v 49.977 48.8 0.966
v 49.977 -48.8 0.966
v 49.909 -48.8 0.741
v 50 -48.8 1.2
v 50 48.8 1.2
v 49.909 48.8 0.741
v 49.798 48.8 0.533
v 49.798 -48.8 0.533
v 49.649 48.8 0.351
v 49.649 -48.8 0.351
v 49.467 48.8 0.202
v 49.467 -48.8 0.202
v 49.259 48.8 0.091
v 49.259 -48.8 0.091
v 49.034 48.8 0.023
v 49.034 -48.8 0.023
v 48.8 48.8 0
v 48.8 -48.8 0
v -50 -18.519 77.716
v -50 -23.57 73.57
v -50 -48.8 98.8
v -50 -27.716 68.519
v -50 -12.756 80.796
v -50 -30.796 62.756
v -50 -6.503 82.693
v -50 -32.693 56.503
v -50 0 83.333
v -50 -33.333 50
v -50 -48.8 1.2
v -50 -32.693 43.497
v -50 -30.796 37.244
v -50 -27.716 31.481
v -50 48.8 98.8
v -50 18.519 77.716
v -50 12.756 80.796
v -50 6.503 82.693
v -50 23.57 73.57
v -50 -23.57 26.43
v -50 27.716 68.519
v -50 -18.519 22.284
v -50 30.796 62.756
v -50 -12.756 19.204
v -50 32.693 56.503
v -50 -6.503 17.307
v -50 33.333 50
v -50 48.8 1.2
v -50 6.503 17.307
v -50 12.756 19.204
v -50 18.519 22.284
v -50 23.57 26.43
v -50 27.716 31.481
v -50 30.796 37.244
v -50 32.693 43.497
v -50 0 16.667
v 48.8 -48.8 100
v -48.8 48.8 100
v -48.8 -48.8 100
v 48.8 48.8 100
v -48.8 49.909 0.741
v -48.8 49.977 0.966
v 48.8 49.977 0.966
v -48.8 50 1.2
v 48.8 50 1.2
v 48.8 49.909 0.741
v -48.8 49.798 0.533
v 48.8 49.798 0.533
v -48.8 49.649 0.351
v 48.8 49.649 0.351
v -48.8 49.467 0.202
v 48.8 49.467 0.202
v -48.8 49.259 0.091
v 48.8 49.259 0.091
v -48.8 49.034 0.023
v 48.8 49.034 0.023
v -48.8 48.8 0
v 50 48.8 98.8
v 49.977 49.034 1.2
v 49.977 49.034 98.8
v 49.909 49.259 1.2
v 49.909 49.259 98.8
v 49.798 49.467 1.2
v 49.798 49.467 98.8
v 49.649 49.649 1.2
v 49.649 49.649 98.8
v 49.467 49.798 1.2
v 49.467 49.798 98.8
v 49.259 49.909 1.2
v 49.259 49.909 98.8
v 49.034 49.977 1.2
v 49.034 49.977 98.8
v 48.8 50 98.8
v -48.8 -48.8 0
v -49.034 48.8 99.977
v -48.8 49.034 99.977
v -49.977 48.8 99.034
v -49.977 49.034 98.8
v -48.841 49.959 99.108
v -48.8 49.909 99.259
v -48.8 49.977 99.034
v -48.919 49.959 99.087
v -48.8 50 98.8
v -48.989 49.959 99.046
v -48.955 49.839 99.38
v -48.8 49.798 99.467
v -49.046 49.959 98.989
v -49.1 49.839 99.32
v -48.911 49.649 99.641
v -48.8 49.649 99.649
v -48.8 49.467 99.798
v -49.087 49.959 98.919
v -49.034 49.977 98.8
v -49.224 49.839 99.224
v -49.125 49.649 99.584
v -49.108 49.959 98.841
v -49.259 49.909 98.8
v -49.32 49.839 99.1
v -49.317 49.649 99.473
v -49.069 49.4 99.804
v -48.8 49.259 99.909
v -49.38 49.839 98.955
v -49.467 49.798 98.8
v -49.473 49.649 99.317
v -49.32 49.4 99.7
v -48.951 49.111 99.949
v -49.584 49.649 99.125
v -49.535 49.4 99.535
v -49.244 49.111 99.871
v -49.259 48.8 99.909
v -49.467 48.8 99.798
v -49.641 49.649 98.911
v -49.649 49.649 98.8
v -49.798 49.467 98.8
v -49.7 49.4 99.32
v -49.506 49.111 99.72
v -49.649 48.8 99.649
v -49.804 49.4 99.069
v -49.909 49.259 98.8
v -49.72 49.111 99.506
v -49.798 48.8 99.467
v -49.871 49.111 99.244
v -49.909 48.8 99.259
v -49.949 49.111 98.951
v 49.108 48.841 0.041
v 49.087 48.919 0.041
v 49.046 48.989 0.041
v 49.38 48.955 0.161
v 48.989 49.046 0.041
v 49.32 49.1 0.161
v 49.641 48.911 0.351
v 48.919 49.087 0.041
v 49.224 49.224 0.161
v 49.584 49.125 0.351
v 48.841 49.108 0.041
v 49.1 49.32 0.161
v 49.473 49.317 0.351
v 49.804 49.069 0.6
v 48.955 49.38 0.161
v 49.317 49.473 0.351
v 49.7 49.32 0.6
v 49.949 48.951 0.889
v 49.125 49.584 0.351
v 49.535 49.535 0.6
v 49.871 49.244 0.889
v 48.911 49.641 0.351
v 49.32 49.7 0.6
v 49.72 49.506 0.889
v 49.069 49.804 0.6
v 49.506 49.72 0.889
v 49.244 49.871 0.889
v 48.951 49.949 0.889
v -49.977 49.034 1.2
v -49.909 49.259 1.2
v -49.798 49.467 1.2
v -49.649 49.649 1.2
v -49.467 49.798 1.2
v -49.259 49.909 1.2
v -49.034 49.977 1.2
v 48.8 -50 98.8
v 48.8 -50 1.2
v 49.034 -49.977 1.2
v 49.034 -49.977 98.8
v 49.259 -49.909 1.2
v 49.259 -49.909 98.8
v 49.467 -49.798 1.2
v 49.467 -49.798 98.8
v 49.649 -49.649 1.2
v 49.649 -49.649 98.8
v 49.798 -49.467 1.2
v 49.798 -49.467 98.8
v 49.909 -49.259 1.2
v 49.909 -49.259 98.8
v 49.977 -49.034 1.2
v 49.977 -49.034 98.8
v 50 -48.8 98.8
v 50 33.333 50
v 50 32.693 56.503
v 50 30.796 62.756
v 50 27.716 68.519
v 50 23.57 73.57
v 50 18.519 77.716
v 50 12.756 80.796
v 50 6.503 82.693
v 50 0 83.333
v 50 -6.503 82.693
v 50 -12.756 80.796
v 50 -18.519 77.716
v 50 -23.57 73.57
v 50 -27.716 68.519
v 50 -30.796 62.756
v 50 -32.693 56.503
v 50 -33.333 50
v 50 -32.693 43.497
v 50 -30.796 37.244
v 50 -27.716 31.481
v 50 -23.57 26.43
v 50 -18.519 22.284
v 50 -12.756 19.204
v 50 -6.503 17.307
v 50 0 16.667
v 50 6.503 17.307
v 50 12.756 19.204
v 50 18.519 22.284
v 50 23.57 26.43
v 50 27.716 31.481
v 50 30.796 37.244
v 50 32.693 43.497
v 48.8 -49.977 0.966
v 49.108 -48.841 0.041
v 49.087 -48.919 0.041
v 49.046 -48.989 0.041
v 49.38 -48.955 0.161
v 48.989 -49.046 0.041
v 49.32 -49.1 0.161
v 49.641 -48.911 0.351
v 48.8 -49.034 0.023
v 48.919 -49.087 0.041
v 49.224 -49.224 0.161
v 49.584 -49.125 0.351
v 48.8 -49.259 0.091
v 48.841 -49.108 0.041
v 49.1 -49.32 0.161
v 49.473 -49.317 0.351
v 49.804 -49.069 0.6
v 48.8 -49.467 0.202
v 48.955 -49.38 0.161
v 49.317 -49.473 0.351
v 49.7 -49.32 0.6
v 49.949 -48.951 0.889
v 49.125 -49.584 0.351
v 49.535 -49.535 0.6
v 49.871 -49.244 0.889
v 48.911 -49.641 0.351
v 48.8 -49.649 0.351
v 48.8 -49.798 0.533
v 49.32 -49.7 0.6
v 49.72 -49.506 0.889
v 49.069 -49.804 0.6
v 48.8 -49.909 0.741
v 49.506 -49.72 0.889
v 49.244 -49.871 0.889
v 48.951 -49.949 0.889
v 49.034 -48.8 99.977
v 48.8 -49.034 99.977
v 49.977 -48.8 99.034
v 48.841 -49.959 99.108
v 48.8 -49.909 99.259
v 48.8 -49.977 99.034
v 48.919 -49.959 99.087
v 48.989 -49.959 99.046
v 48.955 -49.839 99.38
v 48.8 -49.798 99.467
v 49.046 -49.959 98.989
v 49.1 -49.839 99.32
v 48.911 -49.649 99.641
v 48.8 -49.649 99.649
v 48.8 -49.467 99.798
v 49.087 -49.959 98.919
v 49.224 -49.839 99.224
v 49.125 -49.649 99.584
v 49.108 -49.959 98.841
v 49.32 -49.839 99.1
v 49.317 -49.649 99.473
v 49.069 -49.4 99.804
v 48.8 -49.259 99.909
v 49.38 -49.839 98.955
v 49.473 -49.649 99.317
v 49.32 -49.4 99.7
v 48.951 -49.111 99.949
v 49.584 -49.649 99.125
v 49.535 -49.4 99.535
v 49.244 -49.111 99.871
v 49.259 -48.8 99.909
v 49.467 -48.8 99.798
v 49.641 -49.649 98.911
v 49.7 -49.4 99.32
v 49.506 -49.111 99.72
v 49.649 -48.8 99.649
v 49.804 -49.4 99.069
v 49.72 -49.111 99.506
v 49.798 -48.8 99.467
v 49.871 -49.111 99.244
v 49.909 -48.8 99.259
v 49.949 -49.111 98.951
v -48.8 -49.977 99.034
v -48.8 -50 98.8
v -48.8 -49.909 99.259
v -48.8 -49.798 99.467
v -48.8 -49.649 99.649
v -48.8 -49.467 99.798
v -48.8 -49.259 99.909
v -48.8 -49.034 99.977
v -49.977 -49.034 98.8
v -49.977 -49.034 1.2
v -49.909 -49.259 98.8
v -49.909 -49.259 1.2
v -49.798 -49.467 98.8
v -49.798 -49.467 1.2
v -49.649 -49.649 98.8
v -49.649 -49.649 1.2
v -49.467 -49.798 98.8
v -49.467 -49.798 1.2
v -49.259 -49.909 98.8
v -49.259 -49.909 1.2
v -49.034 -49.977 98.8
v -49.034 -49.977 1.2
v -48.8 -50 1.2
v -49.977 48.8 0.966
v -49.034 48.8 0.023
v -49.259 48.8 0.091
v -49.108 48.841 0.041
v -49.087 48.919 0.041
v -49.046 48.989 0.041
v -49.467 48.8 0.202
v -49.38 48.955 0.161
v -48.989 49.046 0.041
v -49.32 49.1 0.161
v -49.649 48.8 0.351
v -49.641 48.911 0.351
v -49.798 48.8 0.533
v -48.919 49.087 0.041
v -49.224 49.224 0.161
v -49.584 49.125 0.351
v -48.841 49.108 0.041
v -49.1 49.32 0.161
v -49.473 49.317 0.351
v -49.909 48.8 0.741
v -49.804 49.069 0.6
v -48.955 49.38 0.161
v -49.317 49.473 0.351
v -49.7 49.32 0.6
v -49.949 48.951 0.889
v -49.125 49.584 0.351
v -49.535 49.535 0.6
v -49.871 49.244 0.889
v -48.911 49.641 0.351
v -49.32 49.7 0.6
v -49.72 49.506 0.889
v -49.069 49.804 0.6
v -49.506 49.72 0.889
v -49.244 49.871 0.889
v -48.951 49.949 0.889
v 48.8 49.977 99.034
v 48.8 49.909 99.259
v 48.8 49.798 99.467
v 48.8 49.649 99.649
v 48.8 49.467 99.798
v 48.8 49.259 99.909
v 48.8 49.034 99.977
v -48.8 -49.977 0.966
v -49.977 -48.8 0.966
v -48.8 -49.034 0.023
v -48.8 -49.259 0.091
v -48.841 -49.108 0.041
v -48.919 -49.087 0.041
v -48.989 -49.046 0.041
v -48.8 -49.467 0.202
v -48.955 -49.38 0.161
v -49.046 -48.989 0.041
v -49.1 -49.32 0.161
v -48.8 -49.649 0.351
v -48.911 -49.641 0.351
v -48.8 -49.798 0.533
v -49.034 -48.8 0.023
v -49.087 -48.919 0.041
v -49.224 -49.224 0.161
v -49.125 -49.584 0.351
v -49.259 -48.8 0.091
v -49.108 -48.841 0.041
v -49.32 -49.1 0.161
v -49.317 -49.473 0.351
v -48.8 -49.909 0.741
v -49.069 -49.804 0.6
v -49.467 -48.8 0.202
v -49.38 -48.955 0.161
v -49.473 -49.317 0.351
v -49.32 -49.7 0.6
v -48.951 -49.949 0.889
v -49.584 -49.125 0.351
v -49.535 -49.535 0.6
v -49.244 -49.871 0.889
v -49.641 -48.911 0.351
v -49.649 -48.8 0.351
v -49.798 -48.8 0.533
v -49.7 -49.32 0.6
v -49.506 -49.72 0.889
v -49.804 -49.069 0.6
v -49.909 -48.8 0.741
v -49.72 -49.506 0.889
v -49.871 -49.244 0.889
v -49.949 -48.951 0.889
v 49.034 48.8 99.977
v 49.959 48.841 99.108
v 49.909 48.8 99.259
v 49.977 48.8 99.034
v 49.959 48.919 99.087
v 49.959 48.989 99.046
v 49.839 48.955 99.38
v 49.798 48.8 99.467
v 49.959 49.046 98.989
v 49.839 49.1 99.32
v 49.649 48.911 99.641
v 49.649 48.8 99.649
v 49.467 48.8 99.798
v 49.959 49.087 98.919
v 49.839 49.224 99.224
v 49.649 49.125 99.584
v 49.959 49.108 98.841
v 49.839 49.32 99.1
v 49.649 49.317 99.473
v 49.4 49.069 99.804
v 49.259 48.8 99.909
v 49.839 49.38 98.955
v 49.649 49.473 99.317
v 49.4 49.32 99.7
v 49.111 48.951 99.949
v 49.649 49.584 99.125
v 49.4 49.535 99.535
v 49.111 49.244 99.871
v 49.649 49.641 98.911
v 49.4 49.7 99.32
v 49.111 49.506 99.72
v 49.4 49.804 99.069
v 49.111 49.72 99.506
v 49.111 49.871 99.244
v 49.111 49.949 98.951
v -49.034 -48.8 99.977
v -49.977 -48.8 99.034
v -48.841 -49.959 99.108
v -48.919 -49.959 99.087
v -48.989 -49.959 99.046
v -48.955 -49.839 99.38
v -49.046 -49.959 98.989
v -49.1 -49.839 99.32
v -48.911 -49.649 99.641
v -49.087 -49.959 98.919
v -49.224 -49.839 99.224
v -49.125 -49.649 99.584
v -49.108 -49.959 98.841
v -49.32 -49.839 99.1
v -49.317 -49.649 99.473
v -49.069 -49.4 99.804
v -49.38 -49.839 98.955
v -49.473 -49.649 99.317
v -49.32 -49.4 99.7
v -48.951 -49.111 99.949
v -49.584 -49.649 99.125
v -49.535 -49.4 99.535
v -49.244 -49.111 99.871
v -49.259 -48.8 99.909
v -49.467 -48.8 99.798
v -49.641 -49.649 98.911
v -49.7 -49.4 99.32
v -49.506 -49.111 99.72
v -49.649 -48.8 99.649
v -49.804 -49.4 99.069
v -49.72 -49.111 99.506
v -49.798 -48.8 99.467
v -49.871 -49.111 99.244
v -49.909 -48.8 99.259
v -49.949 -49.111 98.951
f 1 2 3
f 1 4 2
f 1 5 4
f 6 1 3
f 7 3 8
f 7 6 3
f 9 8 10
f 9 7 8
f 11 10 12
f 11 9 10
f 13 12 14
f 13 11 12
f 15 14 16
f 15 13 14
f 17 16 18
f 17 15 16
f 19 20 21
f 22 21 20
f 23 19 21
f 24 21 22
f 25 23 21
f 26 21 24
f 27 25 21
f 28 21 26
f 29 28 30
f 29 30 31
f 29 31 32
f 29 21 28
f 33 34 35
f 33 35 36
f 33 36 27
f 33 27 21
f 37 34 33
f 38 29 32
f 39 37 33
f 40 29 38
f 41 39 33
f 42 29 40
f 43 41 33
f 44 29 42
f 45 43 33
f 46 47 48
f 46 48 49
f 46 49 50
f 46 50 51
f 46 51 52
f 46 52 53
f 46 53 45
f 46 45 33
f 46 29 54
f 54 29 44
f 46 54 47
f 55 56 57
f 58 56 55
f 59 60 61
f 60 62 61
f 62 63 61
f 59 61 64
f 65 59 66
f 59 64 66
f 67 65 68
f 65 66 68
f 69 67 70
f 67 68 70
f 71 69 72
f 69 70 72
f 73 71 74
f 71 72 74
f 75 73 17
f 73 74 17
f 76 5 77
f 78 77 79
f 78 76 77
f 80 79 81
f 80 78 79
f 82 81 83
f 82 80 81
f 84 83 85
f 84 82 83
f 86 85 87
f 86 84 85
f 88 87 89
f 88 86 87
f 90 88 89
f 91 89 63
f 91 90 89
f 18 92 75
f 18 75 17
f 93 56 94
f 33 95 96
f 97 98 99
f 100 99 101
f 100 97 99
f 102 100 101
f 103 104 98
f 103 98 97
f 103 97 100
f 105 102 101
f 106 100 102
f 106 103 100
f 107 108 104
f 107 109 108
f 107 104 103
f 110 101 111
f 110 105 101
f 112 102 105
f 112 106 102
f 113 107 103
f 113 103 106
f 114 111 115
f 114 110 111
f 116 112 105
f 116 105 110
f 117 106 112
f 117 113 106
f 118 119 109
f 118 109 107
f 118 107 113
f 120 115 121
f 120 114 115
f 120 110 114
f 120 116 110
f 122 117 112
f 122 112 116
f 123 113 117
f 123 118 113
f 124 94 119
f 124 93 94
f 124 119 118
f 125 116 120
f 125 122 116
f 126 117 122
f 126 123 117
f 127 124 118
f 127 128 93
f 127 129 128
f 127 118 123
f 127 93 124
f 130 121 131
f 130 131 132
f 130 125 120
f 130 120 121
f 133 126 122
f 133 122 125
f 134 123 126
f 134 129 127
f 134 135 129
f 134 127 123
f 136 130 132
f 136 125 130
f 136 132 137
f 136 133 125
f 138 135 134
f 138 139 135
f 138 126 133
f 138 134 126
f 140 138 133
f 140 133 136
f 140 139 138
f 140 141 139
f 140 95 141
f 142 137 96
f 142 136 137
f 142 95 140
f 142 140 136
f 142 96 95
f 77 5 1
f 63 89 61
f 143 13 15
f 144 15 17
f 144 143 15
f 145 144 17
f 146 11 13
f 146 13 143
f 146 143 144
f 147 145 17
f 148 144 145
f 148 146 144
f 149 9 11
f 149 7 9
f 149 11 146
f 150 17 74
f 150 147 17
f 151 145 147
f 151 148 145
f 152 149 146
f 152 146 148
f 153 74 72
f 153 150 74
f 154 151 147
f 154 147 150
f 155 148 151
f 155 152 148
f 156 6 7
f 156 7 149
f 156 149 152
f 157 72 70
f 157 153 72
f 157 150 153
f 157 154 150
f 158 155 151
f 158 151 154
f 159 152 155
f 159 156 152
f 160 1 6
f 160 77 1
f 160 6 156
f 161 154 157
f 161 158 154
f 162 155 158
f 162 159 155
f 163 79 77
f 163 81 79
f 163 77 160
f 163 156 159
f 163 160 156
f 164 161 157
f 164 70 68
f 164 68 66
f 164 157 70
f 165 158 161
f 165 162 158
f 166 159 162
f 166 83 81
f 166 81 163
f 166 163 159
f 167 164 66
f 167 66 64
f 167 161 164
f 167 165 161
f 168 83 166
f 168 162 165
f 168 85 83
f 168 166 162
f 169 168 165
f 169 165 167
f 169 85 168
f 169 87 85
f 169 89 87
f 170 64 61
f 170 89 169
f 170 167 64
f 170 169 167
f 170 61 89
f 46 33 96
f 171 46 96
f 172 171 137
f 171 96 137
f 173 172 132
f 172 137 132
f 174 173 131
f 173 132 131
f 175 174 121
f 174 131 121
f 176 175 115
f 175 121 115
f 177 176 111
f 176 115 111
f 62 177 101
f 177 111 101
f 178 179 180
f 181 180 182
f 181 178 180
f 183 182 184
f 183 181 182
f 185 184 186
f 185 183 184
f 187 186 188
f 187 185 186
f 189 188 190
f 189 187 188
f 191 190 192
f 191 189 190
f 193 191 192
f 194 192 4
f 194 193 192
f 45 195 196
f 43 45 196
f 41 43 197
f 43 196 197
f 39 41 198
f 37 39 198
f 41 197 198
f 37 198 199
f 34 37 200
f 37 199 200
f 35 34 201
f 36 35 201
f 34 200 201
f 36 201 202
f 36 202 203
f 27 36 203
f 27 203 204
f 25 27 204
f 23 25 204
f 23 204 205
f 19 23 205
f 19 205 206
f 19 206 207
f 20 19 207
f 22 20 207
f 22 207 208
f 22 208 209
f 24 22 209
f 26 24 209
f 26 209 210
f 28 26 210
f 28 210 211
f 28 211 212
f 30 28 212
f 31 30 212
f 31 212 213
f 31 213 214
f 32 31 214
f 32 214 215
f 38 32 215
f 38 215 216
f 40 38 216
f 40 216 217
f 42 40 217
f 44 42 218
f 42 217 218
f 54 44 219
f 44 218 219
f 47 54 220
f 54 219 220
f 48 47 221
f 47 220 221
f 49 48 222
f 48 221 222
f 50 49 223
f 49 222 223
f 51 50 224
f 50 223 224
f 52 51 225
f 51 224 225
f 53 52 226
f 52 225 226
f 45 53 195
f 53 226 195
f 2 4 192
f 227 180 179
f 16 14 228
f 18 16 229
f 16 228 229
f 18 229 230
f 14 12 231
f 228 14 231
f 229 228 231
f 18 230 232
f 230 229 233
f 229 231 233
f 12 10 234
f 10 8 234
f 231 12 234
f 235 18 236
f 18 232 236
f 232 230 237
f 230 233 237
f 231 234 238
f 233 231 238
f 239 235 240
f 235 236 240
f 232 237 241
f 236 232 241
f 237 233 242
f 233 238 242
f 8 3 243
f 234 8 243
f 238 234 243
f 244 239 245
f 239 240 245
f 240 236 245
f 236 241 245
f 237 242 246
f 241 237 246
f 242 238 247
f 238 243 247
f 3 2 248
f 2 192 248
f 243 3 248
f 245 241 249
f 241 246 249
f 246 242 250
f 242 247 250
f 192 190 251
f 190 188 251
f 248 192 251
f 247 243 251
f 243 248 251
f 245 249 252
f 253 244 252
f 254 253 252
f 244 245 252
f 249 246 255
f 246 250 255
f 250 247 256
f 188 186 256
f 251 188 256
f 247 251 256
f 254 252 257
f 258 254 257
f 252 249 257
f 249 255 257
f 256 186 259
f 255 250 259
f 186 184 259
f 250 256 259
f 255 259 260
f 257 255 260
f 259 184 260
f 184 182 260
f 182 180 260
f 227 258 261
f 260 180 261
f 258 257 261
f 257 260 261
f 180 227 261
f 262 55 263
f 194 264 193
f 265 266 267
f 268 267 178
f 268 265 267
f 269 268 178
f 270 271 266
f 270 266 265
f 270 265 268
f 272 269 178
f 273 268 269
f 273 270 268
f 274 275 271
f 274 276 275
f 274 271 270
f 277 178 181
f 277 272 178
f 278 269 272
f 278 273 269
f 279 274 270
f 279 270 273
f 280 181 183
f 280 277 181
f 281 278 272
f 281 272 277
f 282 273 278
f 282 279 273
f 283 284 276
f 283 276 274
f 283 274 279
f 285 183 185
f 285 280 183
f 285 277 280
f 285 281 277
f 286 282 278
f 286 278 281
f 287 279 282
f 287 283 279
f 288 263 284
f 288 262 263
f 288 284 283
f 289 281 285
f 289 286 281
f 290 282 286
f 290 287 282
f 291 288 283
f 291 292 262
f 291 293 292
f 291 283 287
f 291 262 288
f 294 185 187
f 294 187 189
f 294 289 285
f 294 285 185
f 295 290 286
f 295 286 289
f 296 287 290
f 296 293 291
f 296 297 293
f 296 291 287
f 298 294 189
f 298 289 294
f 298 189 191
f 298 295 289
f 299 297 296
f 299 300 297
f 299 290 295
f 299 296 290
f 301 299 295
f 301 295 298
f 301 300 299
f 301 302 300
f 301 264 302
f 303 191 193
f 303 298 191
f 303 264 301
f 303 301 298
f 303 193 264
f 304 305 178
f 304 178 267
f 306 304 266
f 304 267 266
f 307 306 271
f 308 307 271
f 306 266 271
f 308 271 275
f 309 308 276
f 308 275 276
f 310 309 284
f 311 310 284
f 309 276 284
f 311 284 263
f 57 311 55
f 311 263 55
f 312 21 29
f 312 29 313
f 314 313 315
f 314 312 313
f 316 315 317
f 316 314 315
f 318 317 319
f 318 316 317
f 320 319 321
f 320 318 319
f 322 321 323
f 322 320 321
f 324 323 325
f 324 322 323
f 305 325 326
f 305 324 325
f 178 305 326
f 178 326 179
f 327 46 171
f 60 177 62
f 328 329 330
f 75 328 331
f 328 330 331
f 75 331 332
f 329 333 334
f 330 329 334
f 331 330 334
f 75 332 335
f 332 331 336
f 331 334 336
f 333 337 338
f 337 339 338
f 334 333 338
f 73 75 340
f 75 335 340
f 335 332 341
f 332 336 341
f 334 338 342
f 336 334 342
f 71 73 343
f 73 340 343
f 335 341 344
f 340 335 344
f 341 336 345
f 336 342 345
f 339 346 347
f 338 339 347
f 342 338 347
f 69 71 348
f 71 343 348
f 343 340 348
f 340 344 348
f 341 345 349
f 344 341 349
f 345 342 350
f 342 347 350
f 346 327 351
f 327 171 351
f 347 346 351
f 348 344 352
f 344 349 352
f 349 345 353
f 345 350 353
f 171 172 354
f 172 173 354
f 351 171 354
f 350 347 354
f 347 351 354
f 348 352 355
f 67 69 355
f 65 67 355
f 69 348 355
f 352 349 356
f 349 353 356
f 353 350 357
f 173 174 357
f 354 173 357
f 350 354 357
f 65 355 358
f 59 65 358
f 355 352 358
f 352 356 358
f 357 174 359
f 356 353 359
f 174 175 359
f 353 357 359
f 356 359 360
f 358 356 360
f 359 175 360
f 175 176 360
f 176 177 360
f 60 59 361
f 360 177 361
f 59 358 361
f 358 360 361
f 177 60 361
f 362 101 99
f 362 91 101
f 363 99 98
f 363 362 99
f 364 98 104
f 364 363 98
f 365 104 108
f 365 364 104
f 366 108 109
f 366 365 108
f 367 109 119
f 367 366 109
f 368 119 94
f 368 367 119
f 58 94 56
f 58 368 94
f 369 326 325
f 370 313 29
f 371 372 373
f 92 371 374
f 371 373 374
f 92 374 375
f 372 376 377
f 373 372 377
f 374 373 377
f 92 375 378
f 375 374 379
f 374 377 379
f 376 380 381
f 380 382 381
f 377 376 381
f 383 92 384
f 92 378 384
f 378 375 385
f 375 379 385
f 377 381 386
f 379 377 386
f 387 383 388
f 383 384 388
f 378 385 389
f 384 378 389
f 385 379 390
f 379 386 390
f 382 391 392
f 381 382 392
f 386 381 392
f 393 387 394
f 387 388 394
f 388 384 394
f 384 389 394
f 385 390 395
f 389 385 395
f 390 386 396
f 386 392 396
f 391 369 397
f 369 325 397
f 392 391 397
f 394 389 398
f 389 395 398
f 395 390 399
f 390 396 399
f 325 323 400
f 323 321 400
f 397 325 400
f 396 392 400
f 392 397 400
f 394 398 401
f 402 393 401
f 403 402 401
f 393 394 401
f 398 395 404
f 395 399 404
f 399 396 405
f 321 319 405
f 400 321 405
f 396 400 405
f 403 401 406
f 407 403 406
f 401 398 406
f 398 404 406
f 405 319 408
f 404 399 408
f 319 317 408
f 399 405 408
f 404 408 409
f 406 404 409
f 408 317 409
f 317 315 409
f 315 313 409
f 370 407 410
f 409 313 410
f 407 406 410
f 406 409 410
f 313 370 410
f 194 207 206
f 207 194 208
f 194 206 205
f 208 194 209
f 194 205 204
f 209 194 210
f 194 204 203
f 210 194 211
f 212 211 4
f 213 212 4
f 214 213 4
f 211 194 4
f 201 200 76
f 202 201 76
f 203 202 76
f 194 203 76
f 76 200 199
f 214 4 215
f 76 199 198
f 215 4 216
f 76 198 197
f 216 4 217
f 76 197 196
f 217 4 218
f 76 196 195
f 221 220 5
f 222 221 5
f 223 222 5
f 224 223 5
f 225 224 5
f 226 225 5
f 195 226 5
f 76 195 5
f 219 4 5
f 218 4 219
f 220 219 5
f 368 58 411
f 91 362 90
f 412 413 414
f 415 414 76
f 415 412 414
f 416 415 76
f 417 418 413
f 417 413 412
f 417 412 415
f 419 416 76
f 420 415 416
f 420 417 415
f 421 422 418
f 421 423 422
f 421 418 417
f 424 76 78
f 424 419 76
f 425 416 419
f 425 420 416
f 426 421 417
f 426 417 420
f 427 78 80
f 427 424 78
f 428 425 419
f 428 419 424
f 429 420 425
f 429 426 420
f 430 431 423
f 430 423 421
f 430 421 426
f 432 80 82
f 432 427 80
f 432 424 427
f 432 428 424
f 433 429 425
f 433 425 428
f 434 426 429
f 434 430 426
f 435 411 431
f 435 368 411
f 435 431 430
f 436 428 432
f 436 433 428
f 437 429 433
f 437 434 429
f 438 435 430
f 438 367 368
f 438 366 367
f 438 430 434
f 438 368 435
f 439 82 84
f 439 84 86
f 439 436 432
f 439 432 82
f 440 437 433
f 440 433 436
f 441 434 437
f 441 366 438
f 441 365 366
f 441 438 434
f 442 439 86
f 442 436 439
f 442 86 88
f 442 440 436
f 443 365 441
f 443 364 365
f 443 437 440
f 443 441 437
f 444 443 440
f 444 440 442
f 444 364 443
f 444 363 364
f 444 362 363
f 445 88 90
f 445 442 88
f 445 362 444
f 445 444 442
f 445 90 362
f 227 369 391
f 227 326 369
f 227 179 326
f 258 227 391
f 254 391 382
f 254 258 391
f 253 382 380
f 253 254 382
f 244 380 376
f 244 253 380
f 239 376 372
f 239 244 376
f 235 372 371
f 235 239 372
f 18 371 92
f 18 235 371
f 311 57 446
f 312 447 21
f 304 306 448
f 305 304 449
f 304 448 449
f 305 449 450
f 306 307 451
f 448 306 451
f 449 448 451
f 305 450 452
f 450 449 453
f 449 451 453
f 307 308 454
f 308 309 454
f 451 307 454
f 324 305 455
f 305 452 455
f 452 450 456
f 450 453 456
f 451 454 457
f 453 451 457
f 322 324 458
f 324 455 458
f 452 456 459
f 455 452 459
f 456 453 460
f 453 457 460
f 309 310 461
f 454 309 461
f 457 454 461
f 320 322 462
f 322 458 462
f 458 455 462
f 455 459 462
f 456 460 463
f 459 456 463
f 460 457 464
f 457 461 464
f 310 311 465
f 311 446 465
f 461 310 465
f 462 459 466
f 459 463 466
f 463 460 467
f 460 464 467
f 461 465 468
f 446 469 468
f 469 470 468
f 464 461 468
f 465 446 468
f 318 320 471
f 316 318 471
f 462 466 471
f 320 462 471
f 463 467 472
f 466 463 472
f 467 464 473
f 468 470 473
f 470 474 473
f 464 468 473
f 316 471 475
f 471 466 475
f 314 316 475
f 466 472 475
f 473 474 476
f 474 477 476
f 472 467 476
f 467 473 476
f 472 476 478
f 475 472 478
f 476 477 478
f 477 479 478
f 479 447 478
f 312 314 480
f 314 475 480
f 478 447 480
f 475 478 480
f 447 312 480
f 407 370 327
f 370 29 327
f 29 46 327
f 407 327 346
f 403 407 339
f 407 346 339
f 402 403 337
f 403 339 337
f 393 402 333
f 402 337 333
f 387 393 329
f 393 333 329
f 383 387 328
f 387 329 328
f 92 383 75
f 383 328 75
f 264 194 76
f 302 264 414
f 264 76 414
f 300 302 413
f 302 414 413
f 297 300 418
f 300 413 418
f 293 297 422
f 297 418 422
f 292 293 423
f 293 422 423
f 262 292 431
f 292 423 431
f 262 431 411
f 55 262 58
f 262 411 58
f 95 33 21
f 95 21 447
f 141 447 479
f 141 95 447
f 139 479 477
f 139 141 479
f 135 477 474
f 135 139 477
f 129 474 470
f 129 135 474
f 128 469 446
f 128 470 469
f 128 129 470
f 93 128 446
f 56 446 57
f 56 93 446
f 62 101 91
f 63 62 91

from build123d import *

# Parameters (mm, degrees)
F0_W     = 100
F0_H     = 100
F1_DEPTH = 100
F3_R     = 1.2
F4_R     = 33.33333
F5_DEPTH = 100.001


with BuildPart() as f1:
    # F0 (on Top) → F1 (new body)
    with BuildSketch(Plane.XY):
        Rectangle(F0_W, F0_H)
    extrude(amount=F1_DEPTH)

    # F3
    f3_edges = [f1.edges().sort_by_distance(p)[0] for p in [
        (-50, 0, 100),
        (0, 50, 100),
        (50, 0, 100),
        (0, -50, 100),
        (-50, -50, 50),
        (-50, 50, 50),
        (50, -50, 50),
        (50, 50, 50),
        (50, 0, 0),
        (0, -50, 0),
        (-50, 0, 0),
        (0, 50, 0),
    ]]
    fillet(f3_edges, radius=F3_R)

    # F4 (on face) → F5 (cut, through all)
    with BuildSketch(Plane.YZ.offset(50)):
        with Locations((0, 50)):
            Circle(F4_R)
    extrude(amount=-F5_DEPTH, mode=Mode.SUBTRACT)


solid = f1.part
